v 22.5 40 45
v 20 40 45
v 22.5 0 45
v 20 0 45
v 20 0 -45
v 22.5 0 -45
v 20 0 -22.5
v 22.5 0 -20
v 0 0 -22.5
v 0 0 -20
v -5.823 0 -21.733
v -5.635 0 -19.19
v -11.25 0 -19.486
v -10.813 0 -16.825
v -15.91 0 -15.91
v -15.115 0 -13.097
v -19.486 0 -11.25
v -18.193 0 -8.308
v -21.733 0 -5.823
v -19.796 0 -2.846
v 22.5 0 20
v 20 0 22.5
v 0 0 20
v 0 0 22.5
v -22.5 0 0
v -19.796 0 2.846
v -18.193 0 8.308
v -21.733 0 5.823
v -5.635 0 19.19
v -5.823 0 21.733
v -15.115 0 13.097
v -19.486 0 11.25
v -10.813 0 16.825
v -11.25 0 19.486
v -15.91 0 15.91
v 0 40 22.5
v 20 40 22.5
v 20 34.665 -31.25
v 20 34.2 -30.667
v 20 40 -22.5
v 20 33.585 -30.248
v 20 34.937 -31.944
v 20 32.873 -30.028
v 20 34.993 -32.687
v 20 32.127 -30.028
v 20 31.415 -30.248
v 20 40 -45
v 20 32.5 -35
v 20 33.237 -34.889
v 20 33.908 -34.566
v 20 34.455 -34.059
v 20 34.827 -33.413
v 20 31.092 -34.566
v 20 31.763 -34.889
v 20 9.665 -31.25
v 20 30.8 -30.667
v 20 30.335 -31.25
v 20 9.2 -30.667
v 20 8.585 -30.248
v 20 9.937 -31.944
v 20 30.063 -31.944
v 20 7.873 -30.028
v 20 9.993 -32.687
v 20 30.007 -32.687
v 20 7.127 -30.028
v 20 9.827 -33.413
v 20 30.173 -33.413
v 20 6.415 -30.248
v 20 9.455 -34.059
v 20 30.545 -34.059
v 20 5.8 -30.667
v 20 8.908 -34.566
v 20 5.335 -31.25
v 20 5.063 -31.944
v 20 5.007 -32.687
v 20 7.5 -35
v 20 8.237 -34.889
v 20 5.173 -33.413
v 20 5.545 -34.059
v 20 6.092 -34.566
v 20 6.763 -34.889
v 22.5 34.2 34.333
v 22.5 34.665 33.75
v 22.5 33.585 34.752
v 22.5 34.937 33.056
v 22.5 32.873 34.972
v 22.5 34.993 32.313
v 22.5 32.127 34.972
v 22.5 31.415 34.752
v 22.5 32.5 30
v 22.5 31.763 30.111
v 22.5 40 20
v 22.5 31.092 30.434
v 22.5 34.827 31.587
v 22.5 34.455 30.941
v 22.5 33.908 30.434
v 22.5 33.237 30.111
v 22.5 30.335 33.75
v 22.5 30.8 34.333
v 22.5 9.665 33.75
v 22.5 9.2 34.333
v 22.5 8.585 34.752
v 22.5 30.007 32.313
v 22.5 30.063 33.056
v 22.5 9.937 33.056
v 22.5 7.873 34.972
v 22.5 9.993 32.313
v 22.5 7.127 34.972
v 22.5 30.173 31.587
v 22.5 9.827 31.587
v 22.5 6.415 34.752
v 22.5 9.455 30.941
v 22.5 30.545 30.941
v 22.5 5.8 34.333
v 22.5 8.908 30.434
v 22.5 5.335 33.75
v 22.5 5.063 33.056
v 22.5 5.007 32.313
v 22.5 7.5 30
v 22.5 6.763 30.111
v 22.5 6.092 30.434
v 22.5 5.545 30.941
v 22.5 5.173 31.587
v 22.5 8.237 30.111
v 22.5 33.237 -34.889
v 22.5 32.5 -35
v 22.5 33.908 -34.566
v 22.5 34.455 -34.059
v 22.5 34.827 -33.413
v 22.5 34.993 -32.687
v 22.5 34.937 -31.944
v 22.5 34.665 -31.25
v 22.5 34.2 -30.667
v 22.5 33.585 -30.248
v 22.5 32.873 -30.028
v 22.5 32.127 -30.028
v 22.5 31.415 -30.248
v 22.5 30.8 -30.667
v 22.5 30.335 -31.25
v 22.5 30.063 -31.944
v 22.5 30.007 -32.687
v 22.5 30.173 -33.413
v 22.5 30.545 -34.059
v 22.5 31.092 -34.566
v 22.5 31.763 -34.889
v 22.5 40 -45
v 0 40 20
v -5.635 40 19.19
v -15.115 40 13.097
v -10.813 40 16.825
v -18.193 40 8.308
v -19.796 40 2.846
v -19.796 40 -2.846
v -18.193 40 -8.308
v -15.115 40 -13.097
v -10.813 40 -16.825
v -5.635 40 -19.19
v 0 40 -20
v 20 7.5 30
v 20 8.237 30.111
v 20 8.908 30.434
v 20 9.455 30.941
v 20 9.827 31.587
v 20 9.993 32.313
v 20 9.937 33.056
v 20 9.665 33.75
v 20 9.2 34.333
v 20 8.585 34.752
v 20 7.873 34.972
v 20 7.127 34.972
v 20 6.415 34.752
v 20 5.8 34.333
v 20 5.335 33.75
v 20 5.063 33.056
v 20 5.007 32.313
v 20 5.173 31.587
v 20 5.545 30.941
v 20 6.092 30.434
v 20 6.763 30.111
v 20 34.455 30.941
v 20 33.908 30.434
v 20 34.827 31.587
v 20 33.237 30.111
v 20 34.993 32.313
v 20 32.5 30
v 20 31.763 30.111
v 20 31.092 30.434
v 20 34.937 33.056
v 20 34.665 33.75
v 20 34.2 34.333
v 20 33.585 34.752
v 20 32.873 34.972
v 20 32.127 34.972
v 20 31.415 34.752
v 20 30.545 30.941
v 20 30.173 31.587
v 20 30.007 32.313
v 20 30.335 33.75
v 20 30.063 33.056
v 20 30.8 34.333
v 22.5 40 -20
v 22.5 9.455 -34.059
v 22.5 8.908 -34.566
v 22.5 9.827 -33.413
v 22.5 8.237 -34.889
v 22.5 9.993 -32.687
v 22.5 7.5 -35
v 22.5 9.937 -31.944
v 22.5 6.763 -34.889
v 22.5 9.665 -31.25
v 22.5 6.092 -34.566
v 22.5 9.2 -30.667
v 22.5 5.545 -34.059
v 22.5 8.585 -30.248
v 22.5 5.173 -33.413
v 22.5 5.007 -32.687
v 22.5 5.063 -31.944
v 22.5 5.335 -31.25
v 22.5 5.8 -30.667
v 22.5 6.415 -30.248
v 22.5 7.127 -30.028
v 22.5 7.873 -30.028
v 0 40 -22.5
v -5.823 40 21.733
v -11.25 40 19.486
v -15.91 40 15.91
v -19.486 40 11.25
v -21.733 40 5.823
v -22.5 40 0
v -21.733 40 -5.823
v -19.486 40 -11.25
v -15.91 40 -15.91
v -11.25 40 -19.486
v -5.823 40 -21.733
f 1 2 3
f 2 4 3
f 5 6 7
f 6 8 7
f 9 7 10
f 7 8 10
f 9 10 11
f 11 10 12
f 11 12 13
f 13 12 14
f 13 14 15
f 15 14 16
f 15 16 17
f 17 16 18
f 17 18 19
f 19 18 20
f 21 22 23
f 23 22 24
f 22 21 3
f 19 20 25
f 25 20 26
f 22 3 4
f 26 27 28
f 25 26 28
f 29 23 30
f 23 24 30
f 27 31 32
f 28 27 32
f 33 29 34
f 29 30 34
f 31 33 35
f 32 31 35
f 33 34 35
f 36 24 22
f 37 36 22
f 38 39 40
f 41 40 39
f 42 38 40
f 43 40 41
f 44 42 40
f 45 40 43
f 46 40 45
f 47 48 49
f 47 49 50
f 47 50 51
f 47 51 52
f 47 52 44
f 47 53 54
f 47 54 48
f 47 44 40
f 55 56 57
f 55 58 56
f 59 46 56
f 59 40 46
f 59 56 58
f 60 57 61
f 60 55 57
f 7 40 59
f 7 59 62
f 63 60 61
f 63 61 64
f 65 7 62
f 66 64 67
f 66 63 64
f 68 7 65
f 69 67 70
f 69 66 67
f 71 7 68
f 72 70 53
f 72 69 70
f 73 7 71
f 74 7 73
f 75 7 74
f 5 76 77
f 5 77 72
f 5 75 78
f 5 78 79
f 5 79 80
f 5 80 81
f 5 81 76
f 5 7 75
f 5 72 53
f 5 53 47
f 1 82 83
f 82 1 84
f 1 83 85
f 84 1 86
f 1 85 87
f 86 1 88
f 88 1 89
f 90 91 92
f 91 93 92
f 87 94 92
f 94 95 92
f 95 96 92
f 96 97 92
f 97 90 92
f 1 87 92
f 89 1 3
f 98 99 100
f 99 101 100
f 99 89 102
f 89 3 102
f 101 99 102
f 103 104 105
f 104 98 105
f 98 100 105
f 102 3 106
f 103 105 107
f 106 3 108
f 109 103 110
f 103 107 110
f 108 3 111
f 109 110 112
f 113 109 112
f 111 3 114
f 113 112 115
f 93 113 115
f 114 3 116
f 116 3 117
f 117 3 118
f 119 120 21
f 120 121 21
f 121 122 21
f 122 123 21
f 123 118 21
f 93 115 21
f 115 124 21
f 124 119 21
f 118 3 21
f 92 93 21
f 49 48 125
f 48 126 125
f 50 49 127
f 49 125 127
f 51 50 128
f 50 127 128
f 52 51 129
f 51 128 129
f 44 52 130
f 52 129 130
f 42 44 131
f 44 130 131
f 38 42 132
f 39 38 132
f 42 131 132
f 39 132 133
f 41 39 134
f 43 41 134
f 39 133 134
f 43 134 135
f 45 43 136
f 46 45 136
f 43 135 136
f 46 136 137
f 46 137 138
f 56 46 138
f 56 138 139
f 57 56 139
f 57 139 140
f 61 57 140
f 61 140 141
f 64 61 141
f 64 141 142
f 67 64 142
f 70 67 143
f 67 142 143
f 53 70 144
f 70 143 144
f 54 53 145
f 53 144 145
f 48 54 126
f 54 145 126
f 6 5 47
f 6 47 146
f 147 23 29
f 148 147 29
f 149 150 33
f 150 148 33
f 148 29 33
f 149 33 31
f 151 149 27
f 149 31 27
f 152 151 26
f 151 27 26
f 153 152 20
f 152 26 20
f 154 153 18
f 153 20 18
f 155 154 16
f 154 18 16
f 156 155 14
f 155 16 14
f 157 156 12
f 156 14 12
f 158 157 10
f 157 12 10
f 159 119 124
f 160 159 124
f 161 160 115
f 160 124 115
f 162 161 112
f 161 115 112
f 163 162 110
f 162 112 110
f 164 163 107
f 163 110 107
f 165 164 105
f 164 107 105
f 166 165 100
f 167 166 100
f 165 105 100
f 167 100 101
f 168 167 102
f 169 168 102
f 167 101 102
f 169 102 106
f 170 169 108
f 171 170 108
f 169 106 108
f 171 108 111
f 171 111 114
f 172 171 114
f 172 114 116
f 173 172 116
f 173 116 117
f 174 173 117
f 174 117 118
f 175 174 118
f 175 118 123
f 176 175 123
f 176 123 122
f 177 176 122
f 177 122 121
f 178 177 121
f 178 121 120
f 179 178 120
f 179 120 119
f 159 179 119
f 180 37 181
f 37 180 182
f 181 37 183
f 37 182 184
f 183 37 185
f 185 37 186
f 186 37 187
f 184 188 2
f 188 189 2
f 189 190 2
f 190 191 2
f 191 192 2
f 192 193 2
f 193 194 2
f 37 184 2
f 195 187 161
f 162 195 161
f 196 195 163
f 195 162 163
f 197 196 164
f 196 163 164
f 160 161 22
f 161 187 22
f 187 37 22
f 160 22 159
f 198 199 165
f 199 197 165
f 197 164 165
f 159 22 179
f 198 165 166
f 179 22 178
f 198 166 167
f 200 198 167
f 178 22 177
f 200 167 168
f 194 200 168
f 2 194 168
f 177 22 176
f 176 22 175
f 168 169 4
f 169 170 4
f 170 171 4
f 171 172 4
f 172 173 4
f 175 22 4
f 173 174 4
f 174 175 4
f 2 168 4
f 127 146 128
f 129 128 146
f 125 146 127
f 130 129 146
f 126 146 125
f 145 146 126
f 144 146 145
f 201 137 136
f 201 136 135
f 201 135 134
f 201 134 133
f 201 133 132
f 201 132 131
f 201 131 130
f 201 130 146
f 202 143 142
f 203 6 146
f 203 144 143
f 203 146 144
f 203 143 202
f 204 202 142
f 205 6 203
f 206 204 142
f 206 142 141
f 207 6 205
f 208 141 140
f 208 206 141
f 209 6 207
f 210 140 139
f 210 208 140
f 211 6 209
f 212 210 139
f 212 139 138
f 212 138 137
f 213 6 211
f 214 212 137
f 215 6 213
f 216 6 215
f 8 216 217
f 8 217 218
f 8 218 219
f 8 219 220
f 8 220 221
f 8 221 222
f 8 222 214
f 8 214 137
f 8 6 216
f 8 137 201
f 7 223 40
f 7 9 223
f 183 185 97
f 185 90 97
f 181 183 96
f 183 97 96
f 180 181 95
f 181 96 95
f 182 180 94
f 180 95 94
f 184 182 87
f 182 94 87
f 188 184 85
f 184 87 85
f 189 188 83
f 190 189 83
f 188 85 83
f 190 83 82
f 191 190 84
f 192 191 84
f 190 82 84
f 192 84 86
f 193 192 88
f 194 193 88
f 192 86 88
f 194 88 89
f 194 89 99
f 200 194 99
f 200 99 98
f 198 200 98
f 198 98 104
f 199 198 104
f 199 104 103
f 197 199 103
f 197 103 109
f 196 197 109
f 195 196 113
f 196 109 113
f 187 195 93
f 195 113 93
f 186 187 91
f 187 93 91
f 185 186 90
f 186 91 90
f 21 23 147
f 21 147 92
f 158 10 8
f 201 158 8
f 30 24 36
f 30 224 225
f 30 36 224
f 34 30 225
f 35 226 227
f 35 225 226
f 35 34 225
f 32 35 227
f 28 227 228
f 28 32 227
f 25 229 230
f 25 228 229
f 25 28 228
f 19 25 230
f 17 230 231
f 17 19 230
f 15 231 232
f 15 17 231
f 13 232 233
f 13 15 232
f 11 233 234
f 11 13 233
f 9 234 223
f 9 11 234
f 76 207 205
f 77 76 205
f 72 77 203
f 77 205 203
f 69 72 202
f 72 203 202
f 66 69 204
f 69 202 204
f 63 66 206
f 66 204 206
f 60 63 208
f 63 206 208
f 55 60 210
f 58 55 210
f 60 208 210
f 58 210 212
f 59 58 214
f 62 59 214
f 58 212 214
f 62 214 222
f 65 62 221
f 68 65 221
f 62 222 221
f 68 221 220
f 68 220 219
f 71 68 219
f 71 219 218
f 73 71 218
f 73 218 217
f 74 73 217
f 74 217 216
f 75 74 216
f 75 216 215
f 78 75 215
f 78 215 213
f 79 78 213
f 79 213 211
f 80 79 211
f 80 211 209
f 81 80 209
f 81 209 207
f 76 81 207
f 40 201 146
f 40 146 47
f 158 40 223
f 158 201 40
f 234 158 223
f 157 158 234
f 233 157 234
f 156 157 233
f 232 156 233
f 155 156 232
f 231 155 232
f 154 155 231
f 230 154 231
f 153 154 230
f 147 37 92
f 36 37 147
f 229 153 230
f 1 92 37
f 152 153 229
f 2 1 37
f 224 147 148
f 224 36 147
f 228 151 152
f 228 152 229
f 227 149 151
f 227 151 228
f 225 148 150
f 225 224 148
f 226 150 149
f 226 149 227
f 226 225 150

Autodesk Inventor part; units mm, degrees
ref_plane "YZ Plane" through (0, 0, 0) normal (1, 0, 0) x (0, 1, 0)
ref_plane "XZ Plane" through (0, 0, 0) normal (0, 1, 0) x (-1, 0, 0)
ref_plane "XY Plane" through (0, 0, 0) normal (0, 0, 1) x (1, 0, 0)
sketch "Sketch1" plane through (0, 0, 0) normal (0, 1, 0) x (-1, 0, 0)
  arc A0 (0, -20) -> (0, 20) centre (0, 0) ccw
  arc A1 (0, -22.5) -> (0, 22.5) centre (0, 0) ccw
  line L0 (0, 22.5) -> (-20, 22.5)
  line L1 (-22.5, 20) -> (-20, 20)
  line L2 (-20, 22.5) -> (-20, 45)
  line L3 (-20, 45) -> (-22.5, 45)
  line L4 (-22.5, 45) -> (-22.5, 20)
  line L5 (8.3208, 0) -> (-8.3208, 0)
  line L6 (0, 20) -> (-22.5, 20)
  line L7 (0, -22.5) -> (-20, -22.5)
  line L8 (-22.5, -20) -> (-20, -20)
  line L9 (-20, -22.5) -> (-20, -45)
  line L10 (-20, -45) -> (-22.5, -45)
  line L11 (-22.5, -45) -> (-22.5, -20)
  line L12 (0, -20) -> (-22.5, -20)
  point P0 (-22.5, 22.5)
  point P1 (-22.5, -22.5)
  dimension "d0" = 40
  dimension "d1" = 2.5
  dimension "d2" = 25
extrude "Extrusion1" add sketch "Sketch1" along normal blind 40
sketch "Sketch2" plane through (22.5, 0, 45) normal (1, 0, 0) x (0, 0, -1)
  line L0 (12.5, 32.5) -> (77.5, 32.5)
  line L1 (77.5, 32.5) -> (77.5, 7.5)
  line L2 (77.5, 7.5) -> (12.5, 7.5)
  line L3 (12.5, 7.5) -> (12.5, 32.5)
  line L4 (0, 0) -> (0, 40) projected
  line L5 (25, 40) -> (65, 40) projected
  circle A0 centre (12.5, 32.5) radius 2.5
  circle A1 centre (77.5, 32.5) radius 2.5
  circle A2 centre (77.5, 7.5) radius 2.5
  circle A3 centre (12.5, 7.5) radius 2.5
  point P0 (45, 0)
  dimension "d5" = 65
  dimension "d6" = 25
  dimension "d7" = 12.5
  dimension "d8" = 7.5
  dimension "d9" = 5
  dimension "d10" = 5
  dimension "d11" = 5
  dimension "d12" = 5
extrude "Extrusion2" cut sketch "Sketch2" against normal blind 40 contours L3 A0 L0 | L0 A0 L3 | A1 L1 L0 | L0 L1 A1 | A3 L2 L3 | L3 L2 A3 | A2 L2 L1 | L1 L2 A2
properties part number "steeringbracket"
